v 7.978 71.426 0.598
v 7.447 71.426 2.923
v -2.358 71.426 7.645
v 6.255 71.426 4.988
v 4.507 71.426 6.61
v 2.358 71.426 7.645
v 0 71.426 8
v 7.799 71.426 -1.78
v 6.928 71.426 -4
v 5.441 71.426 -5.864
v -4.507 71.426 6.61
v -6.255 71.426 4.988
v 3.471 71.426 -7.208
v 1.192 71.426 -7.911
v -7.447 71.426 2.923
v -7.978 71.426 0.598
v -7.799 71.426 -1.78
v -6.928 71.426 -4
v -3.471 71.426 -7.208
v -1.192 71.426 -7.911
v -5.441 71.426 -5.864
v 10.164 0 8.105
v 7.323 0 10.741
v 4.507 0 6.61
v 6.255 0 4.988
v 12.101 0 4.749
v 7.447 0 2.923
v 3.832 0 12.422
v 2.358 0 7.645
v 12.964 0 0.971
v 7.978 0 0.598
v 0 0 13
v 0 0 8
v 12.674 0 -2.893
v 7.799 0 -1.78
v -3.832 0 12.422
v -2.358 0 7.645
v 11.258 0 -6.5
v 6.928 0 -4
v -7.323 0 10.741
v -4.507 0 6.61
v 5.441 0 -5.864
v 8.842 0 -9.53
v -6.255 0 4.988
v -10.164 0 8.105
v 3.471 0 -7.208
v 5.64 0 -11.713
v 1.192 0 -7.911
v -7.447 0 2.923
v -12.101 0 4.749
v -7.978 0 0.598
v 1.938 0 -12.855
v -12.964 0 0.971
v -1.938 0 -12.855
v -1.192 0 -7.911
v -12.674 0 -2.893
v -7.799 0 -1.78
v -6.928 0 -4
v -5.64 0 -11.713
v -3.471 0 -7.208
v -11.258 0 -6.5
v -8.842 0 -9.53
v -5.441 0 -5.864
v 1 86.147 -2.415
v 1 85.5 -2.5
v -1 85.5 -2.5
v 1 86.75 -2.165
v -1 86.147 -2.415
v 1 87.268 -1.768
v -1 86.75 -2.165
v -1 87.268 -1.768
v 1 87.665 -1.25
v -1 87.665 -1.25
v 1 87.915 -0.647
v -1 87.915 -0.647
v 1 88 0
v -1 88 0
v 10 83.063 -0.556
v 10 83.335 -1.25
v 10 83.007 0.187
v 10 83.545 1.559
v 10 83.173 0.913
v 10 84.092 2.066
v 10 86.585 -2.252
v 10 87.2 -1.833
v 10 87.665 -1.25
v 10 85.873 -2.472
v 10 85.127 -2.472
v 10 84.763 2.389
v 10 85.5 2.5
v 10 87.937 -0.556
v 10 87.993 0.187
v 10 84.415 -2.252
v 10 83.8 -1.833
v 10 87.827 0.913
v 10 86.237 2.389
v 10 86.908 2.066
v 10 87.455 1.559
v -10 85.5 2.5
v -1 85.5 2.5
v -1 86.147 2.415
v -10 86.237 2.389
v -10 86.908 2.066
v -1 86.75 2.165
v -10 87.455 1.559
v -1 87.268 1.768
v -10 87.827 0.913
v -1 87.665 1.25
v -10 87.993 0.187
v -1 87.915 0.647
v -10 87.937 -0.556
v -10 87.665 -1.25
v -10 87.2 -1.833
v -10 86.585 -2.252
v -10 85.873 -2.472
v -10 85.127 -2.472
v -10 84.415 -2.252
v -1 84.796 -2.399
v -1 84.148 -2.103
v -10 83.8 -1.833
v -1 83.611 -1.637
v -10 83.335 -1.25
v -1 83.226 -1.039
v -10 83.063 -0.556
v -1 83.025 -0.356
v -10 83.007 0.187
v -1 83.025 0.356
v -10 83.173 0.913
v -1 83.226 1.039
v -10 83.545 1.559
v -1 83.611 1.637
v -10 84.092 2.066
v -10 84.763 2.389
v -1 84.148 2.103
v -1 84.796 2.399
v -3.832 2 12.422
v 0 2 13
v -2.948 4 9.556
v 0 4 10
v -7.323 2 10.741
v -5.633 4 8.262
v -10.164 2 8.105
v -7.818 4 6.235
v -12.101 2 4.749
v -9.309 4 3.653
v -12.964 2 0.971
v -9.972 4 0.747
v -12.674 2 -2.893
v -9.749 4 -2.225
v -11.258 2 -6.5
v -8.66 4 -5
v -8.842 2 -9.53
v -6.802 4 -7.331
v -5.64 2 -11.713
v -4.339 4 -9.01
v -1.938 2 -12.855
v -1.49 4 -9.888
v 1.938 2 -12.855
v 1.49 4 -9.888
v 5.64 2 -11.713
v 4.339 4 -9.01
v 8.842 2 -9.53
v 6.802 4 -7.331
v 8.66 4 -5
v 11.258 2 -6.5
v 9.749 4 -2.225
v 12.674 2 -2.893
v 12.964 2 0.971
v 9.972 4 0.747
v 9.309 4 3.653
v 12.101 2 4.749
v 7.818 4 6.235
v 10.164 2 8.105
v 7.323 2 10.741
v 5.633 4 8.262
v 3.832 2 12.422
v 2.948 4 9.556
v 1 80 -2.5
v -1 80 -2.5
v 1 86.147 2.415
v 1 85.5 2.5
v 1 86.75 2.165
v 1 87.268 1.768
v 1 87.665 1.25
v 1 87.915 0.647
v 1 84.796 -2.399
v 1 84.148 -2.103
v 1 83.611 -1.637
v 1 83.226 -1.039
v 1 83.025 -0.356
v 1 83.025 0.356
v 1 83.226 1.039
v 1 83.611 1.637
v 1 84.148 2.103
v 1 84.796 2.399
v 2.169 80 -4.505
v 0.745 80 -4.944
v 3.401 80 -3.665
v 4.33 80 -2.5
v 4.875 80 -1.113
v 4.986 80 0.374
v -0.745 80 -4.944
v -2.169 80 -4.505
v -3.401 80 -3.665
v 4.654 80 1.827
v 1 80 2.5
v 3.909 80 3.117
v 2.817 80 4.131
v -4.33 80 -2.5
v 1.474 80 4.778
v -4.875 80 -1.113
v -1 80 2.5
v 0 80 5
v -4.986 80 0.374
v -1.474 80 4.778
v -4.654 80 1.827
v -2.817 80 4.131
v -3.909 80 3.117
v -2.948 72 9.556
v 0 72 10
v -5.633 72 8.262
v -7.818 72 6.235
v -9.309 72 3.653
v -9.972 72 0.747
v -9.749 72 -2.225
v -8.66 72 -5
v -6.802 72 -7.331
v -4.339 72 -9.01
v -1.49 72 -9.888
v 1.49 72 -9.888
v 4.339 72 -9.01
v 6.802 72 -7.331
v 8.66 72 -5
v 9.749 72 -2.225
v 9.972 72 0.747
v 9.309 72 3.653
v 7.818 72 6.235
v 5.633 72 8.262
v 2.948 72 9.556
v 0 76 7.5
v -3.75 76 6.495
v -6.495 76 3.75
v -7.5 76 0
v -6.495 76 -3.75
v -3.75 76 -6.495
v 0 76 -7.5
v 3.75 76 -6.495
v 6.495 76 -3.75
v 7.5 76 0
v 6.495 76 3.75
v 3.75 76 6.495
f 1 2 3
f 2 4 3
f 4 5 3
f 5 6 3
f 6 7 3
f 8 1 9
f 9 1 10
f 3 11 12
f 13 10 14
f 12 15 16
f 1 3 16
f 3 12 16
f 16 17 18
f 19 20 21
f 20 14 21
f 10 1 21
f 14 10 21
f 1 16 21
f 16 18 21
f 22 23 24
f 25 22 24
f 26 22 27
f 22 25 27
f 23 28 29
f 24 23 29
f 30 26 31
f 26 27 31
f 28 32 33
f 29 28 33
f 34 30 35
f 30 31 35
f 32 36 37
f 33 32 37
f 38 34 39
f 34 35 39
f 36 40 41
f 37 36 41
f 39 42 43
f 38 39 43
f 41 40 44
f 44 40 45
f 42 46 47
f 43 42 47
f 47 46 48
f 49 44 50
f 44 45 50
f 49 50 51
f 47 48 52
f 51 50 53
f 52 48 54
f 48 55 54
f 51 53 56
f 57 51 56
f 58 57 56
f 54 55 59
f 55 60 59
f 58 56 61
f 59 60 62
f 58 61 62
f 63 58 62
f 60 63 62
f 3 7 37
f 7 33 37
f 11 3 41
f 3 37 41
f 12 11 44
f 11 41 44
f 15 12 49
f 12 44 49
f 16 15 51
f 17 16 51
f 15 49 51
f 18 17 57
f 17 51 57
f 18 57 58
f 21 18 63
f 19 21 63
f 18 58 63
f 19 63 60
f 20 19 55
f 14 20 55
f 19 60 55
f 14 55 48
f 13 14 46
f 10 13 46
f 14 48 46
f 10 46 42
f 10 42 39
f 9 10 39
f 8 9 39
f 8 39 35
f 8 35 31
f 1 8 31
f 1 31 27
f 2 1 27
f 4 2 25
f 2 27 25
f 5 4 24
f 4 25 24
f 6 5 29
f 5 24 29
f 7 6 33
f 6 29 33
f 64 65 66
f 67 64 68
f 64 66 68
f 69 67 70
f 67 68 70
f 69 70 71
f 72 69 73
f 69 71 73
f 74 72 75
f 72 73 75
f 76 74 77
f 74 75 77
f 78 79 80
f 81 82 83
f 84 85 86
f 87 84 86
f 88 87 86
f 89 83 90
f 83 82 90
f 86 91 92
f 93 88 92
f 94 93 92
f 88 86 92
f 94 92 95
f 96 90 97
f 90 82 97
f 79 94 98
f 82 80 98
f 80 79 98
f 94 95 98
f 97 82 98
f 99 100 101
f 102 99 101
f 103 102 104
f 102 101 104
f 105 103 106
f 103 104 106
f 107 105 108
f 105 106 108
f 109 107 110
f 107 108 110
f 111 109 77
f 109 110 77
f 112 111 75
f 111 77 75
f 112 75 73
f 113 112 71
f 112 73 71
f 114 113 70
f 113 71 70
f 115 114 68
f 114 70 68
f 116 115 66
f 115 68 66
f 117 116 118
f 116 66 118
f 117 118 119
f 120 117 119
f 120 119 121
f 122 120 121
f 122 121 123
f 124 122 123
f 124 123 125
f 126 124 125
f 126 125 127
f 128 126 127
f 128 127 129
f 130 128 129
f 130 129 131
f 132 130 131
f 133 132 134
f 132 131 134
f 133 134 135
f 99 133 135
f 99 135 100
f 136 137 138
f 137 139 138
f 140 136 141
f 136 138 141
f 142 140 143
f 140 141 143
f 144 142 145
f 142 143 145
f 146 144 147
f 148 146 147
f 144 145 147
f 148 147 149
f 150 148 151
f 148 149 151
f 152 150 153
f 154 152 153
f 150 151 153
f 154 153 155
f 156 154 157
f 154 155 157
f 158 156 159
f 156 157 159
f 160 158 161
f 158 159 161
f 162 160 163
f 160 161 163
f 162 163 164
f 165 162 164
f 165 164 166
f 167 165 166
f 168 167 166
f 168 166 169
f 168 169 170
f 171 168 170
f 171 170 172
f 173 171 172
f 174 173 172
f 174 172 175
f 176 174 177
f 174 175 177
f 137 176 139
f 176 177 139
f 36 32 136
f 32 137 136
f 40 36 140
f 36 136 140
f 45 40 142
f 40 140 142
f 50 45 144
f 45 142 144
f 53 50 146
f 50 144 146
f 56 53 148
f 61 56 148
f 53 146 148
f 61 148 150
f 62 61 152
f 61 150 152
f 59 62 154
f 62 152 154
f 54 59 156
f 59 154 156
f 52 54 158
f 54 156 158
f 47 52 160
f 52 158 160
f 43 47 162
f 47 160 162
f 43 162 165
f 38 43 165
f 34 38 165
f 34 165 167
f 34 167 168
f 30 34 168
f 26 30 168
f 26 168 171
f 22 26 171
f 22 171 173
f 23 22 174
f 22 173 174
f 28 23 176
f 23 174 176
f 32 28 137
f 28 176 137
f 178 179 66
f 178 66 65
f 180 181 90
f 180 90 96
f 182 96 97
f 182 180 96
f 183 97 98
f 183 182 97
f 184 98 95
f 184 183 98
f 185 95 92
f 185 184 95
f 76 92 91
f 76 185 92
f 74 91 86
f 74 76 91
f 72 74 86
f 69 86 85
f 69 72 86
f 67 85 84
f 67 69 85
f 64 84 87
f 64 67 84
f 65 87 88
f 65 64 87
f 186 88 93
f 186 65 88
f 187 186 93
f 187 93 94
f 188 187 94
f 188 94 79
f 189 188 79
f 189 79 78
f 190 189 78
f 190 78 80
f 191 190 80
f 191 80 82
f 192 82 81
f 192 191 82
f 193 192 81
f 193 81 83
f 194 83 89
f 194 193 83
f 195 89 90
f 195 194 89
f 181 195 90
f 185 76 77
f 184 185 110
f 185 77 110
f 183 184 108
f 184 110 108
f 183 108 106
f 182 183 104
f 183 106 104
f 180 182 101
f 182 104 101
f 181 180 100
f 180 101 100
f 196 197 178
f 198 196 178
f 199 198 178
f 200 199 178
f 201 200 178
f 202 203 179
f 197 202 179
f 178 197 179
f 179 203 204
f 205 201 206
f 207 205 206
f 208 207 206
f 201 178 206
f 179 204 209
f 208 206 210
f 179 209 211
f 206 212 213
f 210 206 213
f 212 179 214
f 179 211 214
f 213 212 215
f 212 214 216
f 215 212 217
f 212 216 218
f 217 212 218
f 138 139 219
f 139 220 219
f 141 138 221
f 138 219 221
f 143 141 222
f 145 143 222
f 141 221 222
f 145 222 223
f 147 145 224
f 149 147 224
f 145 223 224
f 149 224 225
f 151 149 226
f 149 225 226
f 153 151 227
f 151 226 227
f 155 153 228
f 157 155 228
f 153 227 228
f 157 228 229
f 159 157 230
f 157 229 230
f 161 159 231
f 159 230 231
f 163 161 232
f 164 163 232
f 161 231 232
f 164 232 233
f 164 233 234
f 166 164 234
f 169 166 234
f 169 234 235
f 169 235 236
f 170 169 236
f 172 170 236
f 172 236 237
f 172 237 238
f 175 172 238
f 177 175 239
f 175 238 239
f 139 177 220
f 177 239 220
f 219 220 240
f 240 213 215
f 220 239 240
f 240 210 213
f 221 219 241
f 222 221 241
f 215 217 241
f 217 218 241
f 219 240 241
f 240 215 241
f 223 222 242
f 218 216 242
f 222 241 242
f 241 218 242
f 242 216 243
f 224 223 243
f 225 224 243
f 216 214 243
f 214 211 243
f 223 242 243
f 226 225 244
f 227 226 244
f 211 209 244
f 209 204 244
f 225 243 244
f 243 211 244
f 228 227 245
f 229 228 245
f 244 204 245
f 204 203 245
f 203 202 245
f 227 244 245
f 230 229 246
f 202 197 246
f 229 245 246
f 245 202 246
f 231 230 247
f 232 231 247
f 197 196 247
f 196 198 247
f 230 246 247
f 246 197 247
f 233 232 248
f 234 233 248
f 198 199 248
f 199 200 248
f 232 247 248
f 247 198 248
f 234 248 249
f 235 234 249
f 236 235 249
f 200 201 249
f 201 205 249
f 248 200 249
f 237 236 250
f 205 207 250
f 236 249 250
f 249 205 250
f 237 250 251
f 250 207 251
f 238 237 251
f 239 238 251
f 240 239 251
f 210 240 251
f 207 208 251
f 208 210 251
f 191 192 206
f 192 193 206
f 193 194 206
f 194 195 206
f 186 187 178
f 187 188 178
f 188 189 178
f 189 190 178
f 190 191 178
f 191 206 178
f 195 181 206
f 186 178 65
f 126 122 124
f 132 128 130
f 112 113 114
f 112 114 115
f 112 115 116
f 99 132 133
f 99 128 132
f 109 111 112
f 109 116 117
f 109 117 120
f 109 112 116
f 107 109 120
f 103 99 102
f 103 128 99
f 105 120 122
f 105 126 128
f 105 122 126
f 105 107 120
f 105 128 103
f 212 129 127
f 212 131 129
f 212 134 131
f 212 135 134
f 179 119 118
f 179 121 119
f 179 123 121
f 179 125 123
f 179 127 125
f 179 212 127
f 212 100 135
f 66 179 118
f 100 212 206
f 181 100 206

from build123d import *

# Parameters (mm, degrees)
SKETCH2_W                = 2
SKETCH2_H                = 5
BOSS_EXTRUDE1_DEPTH      = 8
CUT_EXTRUDE1_DEPTH       = 91.049986119
CUT_EXTRUDE1_DEPTH_BACK  = 91.049986119
BOSS_EXTRUDE2_DEPTH      = 9
BOSS_EXTRUDE2_DEPTH_BACK = 11


with BuildPart() as part:
    # Sketch1 → Revolve1 (revolve)
    with BuildSketch(Plane(origin=(0, 0, 0), x_dir=(0, 0, -1), z_dir=(1, 0, 0))):
        Polygon((-10, 4), (-10, 72), (-5, 80), (0, 80), (0, 71.426407547), (-8, 71.426407547), (-8, 0), (-13, 0), (-13, 2), align=None)
    revolve(axis=Axis((0, 80, 0), (0, -1, 0)))

    # Sketch2 → Boss-Extrude1 (add)
    with BuildSketch(Plane(origin=(0, 80, 0), x_dir=(1, 0, 0), z_dir=(0, 1, 0))):
        Rectangle(SKETCH2_W, SKETCH2_H)
    extrude(amount=BOSS_EXTRUDE1_DEPTH)

    # Sketch3 → Cut-Extrude1 (cut, two sides: drawn at the far end of the back side and taken through both)
    with BuildSketch(Plane.ZY.offset(1).offset(-CUT_EXTRUDE1_DEPTH_BACK)):
        with BuildLine():
            ThreePointArc((-2.5, 85.5), (0, 88), (2.5, 85.5))
            Line((2.5, 85.5), (2.5, 90.5))
            Line((2.5, 90.5), (-2.5, 90.5))
            Line((-2.5, 90.5), (-2.5, 85.5))
        make_face()
    extrude(amount=CUT_EXTRUDE1_DEPTH + CUT_EXTRUDE1_DEPTH_BACK, mode=Mode.SUBTRACT)

    # Sketch3<3> → Boss-Extrude2 (add, two sides: drawn at the far end of the back side and taken through both)
    with BuildSketch(Plane.ZY.offset(1).offset(-BOSS_EXTRUDE2_DEPTH_BACK)):
        with BuildLine():
            ThreePointArc((2.5, 85.5), (0, 88), (-2.5, 85.5))
            ThreePointArc((-2.5, 85.5), (0, 83), (2.5, 85.5))
        make_face()
    extrude(amount=BOSS_EXTRUDE2_DEPTH + BOSS_EXTRUDE2_DEPTH_BACK)


solid = part.part
